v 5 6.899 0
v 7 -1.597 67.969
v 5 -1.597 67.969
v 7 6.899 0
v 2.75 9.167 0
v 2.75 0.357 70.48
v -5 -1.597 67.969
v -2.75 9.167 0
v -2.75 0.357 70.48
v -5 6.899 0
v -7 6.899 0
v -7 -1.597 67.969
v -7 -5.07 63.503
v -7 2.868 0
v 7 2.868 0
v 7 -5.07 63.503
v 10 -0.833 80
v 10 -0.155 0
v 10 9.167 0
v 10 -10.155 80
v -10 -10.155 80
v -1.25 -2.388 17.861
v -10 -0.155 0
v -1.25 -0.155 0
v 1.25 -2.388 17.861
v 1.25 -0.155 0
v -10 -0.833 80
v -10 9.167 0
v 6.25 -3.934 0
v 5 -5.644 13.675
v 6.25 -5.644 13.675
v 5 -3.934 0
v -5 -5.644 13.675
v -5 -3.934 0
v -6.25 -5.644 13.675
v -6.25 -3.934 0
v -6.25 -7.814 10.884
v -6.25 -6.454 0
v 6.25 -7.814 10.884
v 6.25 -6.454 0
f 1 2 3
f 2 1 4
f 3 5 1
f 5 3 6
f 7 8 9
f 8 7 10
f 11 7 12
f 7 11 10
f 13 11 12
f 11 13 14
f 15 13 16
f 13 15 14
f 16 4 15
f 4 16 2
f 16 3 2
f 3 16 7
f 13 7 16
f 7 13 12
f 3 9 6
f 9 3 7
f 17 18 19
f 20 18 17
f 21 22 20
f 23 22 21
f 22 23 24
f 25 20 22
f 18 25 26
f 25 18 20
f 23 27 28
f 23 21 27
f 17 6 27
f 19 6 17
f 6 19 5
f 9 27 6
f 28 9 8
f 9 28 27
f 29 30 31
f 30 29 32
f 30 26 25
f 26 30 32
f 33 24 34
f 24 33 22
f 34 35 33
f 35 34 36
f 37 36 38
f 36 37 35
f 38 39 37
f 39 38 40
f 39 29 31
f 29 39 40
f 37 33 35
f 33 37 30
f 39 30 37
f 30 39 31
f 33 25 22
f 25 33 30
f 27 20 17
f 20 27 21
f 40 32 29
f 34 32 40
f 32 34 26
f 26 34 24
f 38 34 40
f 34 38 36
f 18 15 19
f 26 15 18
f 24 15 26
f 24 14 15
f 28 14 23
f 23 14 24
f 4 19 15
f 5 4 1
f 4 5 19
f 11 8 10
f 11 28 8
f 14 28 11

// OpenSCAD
// file: defs.scad
width = 10;
height = 80;
angle = atan (width / height);
diag = height / cos(angle) + width * tan(angle);
slack = 0.75;

up_down_trim = width*sin(angle);

module slot_poly (slot_slack) {
    polygon ([
        [7-slot_slack, -7+slot_slack],
        [-7+slot_slack, -7+slot_slack],
        [-7+slot_slack, -3-slot_slack],
        [-5, -3-slot_slack],
        [-2+slot_slack, 0],
        [2-slot_slack, 0],
        [5, -3-slot_slack],
        [7-slot_slack, -3-slot_slack]
    ]);
}
// main file
include <defs.scad>

difference () {
    translate ([0,0,-up_down_trim])
    rotate ([angle, 0, 0]) {
        difference () {
            linear_extrude (diag) {
                polygon ([
                    [10, width-slack],
                    [-10, width-slack],
                    [-10, 0],
                    [10, 0]
                ]);
            }
            difference () {
                linear_extrude (diag-3)
                    translate ([0, width, 0])
                        slot_poly (0);
                translate ([-15, 0, diag-20])
                    rotate ([45, 0, 0]) cube (30);
            }
        }
        difference () {
            linear_extrude (20)
                slot_poly (slack);
            translate ([-15, -7+slack, 13])
                rotate ([45,0,0]) cube(30);
        }
    }
    translate ([-15, -15, height]) cube(30);
    translate ([-15, -15, -30]) cube(30);
}
